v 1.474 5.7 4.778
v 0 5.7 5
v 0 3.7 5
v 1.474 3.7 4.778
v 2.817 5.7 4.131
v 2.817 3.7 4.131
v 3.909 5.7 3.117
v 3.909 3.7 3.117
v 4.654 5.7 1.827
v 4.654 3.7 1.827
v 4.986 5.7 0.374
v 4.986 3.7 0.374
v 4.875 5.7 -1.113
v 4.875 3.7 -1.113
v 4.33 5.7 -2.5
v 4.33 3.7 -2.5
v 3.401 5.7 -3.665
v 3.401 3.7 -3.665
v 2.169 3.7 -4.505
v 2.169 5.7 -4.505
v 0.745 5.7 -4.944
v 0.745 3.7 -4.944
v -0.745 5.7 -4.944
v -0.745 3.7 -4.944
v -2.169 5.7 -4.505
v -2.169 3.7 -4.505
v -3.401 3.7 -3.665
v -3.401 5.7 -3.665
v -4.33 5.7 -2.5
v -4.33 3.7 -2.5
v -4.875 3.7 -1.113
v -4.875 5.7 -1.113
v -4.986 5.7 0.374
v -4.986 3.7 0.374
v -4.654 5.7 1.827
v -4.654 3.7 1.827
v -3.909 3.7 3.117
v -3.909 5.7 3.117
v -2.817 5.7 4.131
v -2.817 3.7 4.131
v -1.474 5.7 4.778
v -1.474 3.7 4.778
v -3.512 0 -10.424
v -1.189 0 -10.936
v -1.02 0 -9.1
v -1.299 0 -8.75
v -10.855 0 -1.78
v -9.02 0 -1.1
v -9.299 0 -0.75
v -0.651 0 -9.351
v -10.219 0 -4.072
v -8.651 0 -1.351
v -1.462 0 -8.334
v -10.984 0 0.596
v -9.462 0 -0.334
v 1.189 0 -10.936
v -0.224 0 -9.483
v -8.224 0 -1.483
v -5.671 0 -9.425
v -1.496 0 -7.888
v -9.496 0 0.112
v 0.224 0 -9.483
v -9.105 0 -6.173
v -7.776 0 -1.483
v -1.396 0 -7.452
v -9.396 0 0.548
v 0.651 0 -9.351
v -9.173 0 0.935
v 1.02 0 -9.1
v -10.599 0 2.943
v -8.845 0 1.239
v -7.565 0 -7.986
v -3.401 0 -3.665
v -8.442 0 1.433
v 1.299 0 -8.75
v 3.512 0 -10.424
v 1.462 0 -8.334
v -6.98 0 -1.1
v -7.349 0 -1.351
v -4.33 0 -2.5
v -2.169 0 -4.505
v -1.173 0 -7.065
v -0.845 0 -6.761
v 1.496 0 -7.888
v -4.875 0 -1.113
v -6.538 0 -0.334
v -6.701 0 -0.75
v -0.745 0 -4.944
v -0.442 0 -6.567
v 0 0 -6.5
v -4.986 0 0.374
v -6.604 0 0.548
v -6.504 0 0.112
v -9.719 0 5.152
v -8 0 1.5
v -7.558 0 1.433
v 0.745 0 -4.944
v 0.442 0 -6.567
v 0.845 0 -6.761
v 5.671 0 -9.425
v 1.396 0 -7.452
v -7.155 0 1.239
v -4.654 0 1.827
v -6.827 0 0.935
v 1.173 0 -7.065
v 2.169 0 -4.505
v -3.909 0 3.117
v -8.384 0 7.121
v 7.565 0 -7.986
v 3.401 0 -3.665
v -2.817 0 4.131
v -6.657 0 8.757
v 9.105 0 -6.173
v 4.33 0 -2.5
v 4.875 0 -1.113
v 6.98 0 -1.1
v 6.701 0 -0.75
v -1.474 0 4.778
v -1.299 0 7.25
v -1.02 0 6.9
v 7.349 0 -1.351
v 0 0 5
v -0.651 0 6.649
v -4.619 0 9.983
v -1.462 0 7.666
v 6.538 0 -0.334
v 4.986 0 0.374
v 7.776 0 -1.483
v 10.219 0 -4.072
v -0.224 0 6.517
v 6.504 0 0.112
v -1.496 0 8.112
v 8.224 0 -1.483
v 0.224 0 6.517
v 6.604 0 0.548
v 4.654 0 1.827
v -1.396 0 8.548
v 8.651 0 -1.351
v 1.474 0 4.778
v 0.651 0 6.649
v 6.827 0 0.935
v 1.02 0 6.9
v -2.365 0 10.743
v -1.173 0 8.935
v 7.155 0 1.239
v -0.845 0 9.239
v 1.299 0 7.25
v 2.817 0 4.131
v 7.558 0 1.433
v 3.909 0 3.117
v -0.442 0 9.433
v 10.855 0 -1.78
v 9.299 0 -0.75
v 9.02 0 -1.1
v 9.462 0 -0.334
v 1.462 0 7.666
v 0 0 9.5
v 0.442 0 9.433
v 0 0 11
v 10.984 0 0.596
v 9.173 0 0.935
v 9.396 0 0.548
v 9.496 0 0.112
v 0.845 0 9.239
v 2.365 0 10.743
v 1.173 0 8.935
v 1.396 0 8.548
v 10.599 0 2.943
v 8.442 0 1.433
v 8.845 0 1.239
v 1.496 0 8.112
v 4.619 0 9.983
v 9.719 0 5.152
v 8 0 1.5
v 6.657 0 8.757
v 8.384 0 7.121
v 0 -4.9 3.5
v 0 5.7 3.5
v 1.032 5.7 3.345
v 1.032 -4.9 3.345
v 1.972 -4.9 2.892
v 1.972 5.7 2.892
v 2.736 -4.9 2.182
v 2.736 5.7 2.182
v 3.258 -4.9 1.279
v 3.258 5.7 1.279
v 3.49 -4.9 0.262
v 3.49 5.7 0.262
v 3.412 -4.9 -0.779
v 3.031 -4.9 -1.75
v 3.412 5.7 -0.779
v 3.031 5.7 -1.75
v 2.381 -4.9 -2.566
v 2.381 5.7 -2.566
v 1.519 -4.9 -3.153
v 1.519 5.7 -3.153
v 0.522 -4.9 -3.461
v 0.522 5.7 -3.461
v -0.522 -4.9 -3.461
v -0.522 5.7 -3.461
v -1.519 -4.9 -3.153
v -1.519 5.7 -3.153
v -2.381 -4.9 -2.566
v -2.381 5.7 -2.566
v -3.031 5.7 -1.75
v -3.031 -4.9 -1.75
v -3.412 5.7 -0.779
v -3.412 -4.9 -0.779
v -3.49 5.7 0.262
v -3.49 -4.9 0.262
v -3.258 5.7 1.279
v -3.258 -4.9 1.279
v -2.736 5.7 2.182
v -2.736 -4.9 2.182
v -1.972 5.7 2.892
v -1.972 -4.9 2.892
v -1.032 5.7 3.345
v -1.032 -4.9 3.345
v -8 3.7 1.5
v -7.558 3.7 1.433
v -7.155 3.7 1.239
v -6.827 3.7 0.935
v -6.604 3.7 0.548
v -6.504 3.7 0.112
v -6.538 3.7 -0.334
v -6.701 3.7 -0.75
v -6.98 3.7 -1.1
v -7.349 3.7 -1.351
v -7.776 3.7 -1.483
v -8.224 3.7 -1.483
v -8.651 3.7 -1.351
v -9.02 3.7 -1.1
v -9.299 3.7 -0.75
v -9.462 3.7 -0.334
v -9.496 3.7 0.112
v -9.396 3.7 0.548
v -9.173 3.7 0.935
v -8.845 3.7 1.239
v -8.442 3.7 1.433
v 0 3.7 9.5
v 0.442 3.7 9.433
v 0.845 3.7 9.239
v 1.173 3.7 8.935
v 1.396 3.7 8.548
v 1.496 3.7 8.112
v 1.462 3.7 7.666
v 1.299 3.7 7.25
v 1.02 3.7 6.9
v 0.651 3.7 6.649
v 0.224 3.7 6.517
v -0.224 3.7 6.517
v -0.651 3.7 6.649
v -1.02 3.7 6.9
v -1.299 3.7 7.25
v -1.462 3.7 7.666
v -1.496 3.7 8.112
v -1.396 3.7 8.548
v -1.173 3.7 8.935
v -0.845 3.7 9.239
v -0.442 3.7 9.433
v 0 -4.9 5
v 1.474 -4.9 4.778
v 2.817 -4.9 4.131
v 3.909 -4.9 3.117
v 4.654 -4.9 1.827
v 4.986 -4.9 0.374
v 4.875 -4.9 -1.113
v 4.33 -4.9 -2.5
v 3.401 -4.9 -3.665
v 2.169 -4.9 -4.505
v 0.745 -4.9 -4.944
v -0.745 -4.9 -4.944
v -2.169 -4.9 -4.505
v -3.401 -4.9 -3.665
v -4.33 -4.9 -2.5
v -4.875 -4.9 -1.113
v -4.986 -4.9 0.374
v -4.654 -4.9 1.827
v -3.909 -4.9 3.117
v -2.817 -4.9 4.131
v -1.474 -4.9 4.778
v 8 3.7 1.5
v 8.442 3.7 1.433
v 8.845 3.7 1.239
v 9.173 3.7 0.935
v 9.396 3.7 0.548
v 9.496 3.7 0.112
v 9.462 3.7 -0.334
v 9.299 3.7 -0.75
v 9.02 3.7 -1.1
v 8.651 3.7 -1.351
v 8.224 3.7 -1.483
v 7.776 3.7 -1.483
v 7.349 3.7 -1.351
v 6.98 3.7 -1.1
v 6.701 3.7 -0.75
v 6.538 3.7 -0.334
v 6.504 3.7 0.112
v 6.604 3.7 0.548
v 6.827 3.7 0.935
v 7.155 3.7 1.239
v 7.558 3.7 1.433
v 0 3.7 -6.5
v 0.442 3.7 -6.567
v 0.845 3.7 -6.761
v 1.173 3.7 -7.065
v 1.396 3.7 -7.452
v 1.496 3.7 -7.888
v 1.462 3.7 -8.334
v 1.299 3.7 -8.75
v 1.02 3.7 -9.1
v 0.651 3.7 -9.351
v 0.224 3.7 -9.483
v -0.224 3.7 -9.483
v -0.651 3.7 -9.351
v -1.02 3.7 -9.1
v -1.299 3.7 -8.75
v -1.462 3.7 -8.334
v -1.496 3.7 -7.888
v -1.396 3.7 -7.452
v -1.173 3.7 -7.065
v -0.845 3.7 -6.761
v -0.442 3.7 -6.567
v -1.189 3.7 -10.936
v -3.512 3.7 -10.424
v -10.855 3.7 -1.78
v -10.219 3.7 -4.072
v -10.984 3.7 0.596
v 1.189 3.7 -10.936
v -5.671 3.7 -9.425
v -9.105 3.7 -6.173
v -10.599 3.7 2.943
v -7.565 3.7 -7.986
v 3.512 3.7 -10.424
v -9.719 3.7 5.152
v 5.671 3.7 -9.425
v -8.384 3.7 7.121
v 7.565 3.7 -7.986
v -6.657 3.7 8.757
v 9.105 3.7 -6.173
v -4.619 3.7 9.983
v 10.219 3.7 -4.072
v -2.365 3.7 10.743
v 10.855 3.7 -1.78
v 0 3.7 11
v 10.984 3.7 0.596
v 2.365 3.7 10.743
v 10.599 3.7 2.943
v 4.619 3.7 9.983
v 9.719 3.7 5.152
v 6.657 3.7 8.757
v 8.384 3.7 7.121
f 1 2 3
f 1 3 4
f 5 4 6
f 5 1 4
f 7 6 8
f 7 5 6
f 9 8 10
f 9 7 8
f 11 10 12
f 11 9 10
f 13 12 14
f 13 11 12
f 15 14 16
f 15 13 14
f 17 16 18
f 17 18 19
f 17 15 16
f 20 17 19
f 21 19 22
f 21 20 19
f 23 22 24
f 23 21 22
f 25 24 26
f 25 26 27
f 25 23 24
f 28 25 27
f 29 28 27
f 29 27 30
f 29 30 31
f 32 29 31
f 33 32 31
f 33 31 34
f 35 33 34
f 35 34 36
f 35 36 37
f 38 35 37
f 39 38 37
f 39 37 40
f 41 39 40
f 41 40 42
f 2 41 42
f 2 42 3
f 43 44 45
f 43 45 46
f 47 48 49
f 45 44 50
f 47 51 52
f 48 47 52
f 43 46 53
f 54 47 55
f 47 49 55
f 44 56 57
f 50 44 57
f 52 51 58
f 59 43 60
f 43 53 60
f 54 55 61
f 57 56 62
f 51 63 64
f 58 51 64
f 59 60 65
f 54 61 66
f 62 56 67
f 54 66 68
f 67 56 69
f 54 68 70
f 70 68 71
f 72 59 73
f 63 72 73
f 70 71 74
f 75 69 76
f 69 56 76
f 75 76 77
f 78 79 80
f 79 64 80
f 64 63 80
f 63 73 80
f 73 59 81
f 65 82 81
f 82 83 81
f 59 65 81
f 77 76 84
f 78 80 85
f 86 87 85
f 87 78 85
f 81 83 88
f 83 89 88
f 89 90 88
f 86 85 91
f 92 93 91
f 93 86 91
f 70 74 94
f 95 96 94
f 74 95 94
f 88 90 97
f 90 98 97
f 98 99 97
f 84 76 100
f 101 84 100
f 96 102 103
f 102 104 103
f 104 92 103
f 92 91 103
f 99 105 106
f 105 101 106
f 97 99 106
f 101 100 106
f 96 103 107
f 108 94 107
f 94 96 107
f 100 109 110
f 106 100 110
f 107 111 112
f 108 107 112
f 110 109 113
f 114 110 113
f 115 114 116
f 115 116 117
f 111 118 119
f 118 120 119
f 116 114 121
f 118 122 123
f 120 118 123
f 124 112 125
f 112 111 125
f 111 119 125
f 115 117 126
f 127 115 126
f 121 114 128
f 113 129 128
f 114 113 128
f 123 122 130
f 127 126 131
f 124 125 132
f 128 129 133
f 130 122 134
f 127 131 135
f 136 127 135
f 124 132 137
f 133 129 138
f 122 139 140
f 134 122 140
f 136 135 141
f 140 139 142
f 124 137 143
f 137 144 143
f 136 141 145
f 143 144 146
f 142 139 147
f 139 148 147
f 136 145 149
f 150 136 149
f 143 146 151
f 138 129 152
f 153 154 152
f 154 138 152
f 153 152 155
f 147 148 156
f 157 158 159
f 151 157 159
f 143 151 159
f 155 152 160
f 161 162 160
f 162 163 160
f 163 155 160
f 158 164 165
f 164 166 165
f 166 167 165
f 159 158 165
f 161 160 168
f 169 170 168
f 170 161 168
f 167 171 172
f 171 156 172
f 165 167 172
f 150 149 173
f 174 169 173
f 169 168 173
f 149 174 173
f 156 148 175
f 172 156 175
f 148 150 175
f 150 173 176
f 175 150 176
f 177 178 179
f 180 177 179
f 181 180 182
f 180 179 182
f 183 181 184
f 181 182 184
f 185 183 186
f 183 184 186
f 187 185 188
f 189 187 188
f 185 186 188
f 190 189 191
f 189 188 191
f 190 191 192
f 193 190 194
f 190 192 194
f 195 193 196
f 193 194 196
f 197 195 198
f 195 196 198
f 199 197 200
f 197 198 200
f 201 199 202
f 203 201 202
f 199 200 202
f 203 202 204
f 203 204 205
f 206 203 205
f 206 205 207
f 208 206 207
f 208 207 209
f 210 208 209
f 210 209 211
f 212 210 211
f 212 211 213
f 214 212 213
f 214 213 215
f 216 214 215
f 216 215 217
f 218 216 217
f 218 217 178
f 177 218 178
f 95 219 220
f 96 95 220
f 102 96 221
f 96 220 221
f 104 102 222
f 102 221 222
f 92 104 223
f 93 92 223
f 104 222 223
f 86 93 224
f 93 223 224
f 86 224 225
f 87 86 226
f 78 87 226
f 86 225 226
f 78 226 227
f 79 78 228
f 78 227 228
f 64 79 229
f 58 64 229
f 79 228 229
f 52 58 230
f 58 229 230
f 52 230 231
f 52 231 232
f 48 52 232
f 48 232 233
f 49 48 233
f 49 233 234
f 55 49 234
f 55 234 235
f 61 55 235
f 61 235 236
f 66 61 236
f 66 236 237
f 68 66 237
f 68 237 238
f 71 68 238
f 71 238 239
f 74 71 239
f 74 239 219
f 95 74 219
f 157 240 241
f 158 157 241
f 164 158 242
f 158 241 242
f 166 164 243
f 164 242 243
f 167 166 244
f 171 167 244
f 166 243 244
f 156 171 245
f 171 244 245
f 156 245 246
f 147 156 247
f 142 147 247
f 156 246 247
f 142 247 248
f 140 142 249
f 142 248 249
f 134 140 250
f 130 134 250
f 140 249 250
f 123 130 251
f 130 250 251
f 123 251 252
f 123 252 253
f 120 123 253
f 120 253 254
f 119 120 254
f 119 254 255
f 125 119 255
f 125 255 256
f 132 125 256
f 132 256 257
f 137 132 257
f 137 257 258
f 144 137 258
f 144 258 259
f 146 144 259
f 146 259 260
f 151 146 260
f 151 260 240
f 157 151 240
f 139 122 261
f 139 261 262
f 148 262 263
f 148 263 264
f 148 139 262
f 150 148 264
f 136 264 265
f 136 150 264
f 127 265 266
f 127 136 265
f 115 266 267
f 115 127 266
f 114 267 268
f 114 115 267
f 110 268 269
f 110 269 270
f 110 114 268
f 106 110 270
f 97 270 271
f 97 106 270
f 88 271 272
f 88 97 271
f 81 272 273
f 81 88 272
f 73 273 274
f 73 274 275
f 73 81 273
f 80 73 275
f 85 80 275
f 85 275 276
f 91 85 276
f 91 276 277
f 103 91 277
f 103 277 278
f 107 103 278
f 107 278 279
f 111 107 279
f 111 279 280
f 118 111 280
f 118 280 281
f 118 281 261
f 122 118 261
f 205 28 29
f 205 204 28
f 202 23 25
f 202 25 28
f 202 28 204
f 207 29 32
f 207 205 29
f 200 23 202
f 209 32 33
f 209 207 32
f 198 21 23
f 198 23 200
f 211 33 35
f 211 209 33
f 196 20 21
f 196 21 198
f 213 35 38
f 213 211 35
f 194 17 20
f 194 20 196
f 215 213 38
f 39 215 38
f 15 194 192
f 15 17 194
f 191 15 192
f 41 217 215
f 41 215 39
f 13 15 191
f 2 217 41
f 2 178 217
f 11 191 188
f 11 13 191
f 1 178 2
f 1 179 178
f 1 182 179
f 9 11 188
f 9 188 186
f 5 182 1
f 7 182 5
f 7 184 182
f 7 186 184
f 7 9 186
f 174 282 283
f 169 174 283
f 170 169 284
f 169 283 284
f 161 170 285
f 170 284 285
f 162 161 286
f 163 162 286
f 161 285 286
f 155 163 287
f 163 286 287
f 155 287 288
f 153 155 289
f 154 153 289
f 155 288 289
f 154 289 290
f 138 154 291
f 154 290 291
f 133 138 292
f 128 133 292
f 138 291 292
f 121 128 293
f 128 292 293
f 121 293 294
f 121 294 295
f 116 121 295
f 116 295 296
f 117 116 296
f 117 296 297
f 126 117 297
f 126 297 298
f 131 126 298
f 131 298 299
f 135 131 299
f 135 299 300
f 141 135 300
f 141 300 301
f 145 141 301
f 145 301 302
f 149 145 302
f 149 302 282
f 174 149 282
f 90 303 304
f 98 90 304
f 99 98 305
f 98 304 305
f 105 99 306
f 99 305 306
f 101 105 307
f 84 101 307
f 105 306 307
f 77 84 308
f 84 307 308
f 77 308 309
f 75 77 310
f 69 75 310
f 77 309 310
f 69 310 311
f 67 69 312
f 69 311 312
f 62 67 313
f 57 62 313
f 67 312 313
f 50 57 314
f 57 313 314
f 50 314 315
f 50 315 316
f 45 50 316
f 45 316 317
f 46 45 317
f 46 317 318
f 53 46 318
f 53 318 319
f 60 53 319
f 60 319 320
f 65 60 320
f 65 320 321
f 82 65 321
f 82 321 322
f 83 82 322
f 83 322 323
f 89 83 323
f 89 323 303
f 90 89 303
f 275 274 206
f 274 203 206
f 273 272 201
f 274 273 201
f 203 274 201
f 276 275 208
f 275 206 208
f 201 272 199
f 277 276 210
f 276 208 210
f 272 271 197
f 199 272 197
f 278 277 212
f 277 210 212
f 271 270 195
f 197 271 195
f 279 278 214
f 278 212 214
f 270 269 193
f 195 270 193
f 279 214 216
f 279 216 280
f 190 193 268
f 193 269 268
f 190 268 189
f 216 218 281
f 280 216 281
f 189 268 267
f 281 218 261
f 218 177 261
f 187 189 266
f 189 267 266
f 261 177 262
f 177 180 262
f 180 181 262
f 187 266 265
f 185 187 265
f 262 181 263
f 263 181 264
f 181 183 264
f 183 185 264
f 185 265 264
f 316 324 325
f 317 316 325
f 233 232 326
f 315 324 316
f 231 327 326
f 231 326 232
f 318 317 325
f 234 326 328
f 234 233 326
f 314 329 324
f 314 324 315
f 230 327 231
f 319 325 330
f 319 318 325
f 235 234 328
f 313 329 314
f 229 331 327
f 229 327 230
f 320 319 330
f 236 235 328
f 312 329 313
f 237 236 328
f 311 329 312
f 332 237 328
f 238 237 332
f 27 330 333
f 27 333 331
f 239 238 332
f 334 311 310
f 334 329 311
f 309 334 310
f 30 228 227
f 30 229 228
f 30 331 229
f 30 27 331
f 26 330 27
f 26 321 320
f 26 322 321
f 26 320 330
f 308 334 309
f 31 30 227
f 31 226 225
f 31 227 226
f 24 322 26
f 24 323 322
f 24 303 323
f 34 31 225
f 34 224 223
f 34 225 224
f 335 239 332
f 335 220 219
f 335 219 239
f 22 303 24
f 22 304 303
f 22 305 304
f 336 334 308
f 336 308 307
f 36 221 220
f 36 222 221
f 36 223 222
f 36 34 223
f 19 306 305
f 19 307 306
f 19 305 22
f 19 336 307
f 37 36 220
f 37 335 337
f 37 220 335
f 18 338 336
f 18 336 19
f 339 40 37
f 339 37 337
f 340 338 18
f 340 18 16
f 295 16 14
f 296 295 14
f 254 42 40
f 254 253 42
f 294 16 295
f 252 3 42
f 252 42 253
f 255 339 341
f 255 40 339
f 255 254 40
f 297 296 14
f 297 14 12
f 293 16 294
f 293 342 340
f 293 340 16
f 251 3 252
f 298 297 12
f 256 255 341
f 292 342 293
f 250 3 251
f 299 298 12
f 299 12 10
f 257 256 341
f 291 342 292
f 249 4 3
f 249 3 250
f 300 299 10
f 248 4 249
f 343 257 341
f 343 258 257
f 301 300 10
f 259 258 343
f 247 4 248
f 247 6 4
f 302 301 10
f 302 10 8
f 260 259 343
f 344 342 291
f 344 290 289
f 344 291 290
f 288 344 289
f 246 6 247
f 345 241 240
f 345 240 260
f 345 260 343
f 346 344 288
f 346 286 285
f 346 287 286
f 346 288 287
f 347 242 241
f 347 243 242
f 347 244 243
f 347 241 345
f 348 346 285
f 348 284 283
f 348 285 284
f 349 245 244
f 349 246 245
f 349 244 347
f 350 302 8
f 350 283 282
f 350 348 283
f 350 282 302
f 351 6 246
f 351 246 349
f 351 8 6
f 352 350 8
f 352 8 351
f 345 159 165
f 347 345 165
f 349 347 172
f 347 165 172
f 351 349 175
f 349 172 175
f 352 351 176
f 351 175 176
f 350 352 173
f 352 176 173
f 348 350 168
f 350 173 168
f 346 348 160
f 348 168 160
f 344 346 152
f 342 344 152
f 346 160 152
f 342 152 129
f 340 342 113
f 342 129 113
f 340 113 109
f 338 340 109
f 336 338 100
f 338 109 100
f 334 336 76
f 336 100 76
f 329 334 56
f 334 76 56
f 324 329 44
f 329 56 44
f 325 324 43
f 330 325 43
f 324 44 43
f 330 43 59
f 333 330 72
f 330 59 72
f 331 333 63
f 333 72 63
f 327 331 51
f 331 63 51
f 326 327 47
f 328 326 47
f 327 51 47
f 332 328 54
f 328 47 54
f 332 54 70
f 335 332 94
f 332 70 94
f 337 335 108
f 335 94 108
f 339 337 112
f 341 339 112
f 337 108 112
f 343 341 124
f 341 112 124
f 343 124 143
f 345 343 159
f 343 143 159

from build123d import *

# Parameters (mm, degrees)
SKETCH1_R           = 11
BOSS_EXTRUDE1_DEPTH = 3.7
CUT_EXTRUDE1_REACH  = 17.99
SKETCH2_R           = 1.5
BOSS_EXTRUDE2_START = 2
SKETCH3_R           = 5
BOSS_EXTRUDE2_DEPTH = 10.6
CUT_EXTRUDE2_REACH  = 20.824
SKETCH4_R           = 3.5


with BuildPart() as part:
    # Sketch1 → Boss-Extrude1 (new body)
    with BuildSketch(Plane(origin=(0, 0, 0), x_dir=(1, 0, 0), z_dir=(0, 1, 0))):
        with Locations(Location((0, 0, 0), (0, 0, 270))):
            Circle(SKETCH1_R)
    extrude(amount=BOSS_EXTRUDE1_DEPTH)

    # Sketch2 → Cut-Extrude1 (cut, up to next)
    with BuildSketch(Plane(origin=(0, 3.7, 0), x_dir=(1, 0, 0), z_dir=(0, 1, 0)), mode=Mode.PRIVATE) as cut_extrude1_sk1:
        with Locations(Location((0, 8, 0), (0, 0, 270))):
            Circle(SKETCH2_R)
    cut_extrude1_tool1 = extrude(cut_extrude1_sk1.sketch, amount=-CUT_EXTRUDE1_REACH, mode=Mode.PRIVATE) & part.part
    # Sketch2 → Cut-Extrude1 (cut, up to next)
    with BuildSketch(Plane(origin=(0, 3.7, 0), x_dir=(1, 0, 0), z_dir=(0, 1, 0)), mode=Mode.PRIVATE) as cut_extrude1_sk2:
        with Locations(Location((8, 0, 0), (0, 0, 270))):
            Circle(SKETCH2_R)
    cut_extrude1_tool2 = extrude(cut_extrude1_sk2.sketch, amount=-CUT_EXTRUDE1_REACH, mode=Mode.PRIVATE) & part.part
    # Sketch2 → Cut-Extrude1 (cut, up to next)
    with BuildSketch(Plane(origin=(0, 3.7, 0), x_dir=(1, 0, 0), z_dir=(0, 1, 0)), mode=Mode.PRIVATE) as cut_extrude1_sk3:
        with Locations(Location((0, -8, 0), (0, 0, 270))):
            Circle(SKETCH2_R)
    cut_extrude1_tool3 = extrude(cut_extrude1_sk3.sketch, amount=-CUT_EXTRUDE1_REACH, mode=Mode.PRIVATE) & part.part
    # Sketch2 → Cut-Extrude1 (cut, up to next)
    with BuildSketch(Plane(origin=(0, 3.7, 0), x_dir=(1, 0, 0), z_dir=(0, 1, 0)), mode=Mode.PRIVATE) as cut_extrude1_sk4:
        with Locations(Location((-8, 0, 0), (0, 0, 270))):
            Circle(SKETCH2_R)
    cut_extrude1_tool4 = extrude(cut_extrude1_sk4.sketch, amount=-CUT_EXTRUDE1_REACH, mode=Mode.PRIVATE) & part.part
    add(cut_extrude1_tool1.solids().sort_by_distance((0, 3.7, -8))[0], mode=Mode.SUBTRACT)
    add(cut_extrude1_tool2.solids().sort_by_distance((8, 3.7, 0))[0], mode=Mode.SUBTRACT)
    add(cut_extrude1_tool3.solids().sort_by_distance((0, 3.7, 8))[0], mode=Mode.SUBTRACT)
    add(cut_extrude1_tool4.solids().sort_by_distance((-8, 3.7, 0))[0], mode=Mode.SUBTRACT)

    # Sketch3 → Boss-Extrude2 (add)
    with BuildSketch(Plane(origin=(0, 3.7, 0), x_dir=(1, 0, 0), z_dir=(0, 1, 0)).offset(BOSS_EXTRUDE2_START)):
        with Locations(Location((0, 0, 0), (0, 0, 270))):
            Circle(SKETCH3_R)
    extrude(amount=-BOSS_EXTRUDE2_DEPTH)

    # Sketch4 → Cut-Extrude2 (cut, up to next)
    with BuildSketch(Plane(origin=(0, 5.7, 0), x_dir=(1, 0, 0), z_dir=(0, 1, 0)), mode=Mode.PRIVATE) as cut_extrude2_sk1:
        with Locations(Location((0, 0, 0), (0, 0, 270))):
            Circle(SKETCH4_R)
    cut_extrude2_tool1 = extrude(cut_extrude2_sk1.sketch, amount=-CUT_EXTRUDE2_REACH, mode=Mode.PRIVATE) & part.part
    add(cut_extrude2_tool1.solids().sort_by_distance((0, 5.7, 0))[0], mode=Mode.SUBTRACT)


solid = part.part
